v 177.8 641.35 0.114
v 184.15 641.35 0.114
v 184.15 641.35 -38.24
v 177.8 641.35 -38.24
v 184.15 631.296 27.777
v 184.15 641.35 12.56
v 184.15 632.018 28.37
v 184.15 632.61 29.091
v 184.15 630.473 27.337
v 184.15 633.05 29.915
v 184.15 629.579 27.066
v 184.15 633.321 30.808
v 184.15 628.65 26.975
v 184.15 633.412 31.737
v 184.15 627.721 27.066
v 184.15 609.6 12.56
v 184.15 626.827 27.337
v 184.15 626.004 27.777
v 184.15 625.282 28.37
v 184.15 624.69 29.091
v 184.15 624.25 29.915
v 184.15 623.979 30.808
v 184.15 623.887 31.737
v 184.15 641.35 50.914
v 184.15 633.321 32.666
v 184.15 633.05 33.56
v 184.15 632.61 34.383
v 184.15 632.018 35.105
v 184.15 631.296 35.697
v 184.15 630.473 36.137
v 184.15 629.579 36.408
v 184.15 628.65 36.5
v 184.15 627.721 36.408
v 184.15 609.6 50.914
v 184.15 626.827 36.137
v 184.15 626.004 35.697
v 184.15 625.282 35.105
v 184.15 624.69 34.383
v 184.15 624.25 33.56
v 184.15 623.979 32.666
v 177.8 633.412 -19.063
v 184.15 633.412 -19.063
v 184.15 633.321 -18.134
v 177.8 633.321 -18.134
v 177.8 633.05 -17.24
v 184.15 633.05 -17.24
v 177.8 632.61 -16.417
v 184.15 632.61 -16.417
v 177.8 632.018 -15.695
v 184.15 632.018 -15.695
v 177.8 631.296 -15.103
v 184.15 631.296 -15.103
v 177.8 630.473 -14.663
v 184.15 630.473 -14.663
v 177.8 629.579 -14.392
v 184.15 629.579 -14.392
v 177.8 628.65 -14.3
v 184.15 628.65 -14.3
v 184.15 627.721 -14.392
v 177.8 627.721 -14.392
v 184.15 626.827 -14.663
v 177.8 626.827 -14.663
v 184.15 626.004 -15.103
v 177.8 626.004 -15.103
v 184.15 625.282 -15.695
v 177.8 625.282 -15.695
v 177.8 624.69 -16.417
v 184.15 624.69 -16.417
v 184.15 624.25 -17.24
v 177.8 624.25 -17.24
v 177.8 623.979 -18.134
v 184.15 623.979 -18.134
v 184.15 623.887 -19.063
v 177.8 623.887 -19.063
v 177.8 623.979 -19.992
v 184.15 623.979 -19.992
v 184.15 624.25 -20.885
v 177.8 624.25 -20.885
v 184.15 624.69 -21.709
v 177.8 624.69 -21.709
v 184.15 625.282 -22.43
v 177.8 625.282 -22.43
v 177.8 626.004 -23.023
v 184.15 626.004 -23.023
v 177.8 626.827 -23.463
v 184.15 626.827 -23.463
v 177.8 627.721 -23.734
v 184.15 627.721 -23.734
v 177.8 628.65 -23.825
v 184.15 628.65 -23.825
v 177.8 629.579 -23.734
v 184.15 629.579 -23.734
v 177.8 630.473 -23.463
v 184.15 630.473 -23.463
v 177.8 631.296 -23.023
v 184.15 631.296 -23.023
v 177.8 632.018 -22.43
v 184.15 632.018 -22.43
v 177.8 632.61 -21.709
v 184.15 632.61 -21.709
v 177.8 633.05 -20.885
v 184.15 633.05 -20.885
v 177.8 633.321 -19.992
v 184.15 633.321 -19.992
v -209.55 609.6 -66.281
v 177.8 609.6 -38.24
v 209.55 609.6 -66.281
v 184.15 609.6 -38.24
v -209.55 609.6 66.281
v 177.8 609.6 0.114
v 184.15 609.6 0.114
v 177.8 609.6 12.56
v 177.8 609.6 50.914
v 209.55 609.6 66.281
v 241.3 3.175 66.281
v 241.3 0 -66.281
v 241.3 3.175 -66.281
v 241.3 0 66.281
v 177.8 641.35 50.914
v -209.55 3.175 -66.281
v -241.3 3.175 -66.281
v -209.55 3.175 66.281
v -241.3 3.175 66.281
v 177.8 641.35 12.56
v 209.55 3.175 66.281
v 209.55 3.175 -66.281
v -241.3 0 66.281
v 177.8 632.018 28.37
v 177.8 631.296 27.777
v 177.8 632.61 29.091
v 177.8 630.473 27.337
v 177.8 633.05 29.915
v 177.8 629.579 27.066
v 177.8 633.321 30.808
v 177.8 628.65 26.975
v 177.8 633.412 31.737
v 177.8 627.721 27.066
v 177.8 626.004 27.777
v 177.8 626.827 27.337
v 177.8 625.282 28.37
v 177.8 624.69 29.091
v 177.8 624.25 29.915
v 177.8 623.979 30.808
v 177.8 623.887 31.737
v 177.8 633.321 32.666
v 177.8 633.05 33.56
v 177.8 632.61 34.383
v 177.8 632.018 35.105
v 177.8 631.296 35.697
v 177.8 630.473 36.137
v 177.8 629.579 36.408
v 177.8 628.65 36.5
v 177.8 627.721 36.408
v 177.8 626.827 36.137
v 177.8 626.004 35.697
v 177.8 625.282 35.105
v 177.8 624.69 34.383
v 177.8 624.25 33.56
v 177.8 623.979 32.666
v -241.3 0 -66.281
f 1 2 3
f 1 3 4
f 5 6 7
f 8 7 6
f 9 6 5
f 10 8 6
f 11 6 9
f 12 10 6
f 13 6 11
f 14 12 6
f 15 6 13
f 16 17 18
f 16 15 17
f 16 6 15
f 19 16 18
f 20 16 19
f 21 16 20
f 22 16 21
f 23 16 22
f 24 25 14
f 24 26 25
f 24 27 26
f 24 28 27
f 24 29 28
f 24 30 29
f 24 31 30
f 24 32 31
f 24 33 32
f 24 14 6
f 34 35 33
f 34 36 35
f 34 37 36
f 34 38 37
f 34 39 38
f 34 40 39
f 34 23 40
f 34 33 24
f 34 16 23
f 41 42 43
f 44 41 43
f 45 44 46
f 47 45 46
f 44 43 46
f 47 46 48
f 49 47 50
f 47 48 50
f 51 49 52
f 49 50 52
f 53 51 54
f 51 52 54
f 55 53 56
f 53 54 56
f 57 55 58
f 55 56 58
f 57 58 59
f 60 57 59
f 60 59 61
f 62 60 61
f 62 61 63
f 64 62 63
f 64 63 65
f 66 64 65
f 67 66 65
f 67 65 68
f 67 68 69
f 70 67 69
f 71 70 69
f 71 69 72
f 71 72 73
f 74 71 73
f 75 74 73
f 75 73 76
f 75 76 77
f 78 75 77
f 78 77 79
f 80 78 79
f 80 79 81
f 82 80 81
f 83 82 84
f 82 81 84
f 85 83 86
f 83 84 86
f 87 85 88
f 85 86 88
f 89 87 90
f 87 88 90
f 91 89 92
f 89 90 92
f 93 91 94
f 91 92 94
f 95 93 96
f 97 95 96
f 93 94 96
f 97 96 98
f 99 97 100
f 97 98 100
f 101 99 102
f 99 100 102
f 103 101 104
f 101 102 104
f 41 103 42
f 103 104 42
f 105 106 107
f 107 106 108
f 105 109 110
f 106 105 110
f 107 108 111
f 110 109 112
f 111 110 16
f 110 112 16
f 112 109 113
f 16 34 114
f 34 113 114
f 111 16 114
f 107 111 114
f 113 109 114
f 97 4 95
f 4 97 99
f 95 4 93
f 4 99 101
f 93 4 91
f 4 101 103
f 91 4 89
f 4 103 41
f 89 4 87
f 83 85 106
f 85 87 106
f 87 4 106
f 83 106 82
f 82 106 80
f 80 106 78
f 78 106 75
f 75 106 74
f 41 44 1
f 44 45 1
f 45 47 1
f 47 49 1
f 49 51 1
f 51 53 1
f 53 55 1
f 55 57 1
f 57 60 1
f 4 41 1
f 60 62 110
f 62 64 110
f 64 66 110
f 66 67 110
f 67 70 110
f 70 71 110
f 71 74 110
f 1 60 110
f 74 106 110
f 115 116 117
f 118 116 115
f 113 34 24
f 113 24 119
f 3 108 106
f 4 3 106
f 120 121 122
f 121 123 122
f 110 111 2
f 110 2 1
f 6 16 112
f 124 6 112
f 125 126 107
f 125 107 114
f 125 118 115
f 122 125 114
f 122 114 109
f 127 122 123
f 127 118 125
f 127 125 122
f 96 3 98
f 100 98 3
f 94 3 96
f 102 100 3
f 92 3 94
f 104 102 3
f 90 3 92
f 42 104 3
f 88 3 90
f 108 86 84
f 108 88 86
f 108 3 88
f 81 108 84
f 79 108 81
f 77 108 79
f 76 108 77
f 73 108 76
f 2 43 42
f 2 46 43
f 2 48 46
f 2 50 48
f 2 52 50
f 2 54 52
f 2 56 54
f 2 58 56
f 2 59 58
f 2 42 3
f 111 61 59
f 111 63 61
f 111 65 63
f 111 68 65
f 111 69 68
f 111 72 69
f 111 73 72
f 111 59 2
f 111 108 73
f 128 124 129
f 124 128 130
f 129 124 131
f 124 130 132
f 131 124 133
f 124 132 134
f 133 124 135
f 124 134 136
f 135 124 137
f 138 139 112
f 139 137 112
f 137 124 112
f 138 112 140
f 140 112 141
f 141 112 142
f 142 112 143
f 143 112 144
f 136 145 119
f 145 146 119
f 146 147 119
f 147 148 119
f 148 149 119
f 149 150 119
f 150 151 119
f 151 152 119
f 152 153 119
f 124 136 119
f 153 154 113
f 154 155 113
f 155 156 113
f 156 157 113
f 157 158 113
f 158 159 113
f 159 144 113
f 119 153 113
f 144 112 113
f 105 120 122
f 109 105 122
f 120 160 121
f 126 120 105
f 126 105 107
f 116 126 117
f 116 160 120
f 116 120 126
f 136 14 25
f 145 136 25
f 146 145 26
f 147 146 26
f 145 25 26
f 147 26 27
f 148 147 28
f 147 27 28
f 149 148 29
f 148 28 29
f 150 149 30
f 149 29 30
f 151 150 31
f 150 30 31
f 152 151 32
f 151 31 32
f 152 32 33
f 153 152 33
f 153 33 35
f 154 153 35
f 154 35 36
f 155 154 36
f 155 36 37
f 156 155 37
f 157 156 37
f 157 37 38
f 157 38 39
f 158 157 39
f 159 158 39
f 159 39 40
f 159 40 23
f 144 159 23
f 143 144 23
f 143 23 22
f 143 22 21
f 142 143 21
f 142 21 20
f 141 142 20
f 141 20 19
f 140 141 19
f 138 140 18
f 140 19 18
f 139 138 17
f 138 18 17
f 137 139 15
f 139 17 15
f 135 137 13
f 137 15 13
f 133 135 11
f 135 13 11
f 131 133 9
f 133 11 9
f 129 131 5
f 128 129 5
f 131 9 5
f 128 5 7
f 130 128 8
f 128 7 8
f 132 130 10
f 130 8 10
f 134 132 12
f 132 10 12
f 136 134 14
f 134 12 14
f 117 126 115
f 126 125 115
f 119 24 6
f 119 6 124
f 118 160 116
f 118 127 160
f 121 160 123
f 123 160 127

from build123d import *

# Parameters (mm, degrees)
F0_W     = 419.1
F0_H     = 132.5626
F1_DEPTH = 609.6
F0_W_2   = 31.75
F2_DEPTH = 3.175
F3_W     = 6.35
F3_H     = 38.354
F4_DEPTH = 31.75
F5_R     = 4.7625
F6_DEPTH = 425.451


with BuildPart() as f1:
    # F0 (on Front) → F1 (new body)
    with BuildSketch(Plane.XZ):
        Rectangle(F0_W, F0_H)
    extrude(amount=-F1_DEPTH)

    # F0 (on Front) → F2 (join)
    with BuildSketch(Plane.XZ):
        with Locations((225.425, 0)):
            Rectangle(F0_W_2, F0_H)
        Rectangle(F0_W, F0_H)
        with Locations((-225.425, 0)):
            Rectangle(F0_W_2, F0_H)
    extrude(amount=-F2_DEPTH)

    # F3 (on face) → F4 (join)
    with BuildSketch(Plane(origin=(0, 609.6, 0), x_dir=(-1, 0, 0), z_dir=(0, 1, 0))):
        with Locations((-180.975, 31.7373)):
            Rectangle(F3_W, F3_H)
        with Locations((-180.975, -19.0627)):
            Rectangle(F3_W, F3_H)
    extrude(amount=F4_DEPTH)

    # F5 (on face) → F6 (cut, through all)
    with BuildSketch(Plane.YZ.offset(184.15)):
        with Locations((628.65, 31.7373)):
            Circle(F5_R)
        with Locations((628.65, -19.0627)):
            Circle(F5_R)
    extrude(amount=-F6_DEPTH, mode=Mode.SUBTRACT)


solid = f1.part
